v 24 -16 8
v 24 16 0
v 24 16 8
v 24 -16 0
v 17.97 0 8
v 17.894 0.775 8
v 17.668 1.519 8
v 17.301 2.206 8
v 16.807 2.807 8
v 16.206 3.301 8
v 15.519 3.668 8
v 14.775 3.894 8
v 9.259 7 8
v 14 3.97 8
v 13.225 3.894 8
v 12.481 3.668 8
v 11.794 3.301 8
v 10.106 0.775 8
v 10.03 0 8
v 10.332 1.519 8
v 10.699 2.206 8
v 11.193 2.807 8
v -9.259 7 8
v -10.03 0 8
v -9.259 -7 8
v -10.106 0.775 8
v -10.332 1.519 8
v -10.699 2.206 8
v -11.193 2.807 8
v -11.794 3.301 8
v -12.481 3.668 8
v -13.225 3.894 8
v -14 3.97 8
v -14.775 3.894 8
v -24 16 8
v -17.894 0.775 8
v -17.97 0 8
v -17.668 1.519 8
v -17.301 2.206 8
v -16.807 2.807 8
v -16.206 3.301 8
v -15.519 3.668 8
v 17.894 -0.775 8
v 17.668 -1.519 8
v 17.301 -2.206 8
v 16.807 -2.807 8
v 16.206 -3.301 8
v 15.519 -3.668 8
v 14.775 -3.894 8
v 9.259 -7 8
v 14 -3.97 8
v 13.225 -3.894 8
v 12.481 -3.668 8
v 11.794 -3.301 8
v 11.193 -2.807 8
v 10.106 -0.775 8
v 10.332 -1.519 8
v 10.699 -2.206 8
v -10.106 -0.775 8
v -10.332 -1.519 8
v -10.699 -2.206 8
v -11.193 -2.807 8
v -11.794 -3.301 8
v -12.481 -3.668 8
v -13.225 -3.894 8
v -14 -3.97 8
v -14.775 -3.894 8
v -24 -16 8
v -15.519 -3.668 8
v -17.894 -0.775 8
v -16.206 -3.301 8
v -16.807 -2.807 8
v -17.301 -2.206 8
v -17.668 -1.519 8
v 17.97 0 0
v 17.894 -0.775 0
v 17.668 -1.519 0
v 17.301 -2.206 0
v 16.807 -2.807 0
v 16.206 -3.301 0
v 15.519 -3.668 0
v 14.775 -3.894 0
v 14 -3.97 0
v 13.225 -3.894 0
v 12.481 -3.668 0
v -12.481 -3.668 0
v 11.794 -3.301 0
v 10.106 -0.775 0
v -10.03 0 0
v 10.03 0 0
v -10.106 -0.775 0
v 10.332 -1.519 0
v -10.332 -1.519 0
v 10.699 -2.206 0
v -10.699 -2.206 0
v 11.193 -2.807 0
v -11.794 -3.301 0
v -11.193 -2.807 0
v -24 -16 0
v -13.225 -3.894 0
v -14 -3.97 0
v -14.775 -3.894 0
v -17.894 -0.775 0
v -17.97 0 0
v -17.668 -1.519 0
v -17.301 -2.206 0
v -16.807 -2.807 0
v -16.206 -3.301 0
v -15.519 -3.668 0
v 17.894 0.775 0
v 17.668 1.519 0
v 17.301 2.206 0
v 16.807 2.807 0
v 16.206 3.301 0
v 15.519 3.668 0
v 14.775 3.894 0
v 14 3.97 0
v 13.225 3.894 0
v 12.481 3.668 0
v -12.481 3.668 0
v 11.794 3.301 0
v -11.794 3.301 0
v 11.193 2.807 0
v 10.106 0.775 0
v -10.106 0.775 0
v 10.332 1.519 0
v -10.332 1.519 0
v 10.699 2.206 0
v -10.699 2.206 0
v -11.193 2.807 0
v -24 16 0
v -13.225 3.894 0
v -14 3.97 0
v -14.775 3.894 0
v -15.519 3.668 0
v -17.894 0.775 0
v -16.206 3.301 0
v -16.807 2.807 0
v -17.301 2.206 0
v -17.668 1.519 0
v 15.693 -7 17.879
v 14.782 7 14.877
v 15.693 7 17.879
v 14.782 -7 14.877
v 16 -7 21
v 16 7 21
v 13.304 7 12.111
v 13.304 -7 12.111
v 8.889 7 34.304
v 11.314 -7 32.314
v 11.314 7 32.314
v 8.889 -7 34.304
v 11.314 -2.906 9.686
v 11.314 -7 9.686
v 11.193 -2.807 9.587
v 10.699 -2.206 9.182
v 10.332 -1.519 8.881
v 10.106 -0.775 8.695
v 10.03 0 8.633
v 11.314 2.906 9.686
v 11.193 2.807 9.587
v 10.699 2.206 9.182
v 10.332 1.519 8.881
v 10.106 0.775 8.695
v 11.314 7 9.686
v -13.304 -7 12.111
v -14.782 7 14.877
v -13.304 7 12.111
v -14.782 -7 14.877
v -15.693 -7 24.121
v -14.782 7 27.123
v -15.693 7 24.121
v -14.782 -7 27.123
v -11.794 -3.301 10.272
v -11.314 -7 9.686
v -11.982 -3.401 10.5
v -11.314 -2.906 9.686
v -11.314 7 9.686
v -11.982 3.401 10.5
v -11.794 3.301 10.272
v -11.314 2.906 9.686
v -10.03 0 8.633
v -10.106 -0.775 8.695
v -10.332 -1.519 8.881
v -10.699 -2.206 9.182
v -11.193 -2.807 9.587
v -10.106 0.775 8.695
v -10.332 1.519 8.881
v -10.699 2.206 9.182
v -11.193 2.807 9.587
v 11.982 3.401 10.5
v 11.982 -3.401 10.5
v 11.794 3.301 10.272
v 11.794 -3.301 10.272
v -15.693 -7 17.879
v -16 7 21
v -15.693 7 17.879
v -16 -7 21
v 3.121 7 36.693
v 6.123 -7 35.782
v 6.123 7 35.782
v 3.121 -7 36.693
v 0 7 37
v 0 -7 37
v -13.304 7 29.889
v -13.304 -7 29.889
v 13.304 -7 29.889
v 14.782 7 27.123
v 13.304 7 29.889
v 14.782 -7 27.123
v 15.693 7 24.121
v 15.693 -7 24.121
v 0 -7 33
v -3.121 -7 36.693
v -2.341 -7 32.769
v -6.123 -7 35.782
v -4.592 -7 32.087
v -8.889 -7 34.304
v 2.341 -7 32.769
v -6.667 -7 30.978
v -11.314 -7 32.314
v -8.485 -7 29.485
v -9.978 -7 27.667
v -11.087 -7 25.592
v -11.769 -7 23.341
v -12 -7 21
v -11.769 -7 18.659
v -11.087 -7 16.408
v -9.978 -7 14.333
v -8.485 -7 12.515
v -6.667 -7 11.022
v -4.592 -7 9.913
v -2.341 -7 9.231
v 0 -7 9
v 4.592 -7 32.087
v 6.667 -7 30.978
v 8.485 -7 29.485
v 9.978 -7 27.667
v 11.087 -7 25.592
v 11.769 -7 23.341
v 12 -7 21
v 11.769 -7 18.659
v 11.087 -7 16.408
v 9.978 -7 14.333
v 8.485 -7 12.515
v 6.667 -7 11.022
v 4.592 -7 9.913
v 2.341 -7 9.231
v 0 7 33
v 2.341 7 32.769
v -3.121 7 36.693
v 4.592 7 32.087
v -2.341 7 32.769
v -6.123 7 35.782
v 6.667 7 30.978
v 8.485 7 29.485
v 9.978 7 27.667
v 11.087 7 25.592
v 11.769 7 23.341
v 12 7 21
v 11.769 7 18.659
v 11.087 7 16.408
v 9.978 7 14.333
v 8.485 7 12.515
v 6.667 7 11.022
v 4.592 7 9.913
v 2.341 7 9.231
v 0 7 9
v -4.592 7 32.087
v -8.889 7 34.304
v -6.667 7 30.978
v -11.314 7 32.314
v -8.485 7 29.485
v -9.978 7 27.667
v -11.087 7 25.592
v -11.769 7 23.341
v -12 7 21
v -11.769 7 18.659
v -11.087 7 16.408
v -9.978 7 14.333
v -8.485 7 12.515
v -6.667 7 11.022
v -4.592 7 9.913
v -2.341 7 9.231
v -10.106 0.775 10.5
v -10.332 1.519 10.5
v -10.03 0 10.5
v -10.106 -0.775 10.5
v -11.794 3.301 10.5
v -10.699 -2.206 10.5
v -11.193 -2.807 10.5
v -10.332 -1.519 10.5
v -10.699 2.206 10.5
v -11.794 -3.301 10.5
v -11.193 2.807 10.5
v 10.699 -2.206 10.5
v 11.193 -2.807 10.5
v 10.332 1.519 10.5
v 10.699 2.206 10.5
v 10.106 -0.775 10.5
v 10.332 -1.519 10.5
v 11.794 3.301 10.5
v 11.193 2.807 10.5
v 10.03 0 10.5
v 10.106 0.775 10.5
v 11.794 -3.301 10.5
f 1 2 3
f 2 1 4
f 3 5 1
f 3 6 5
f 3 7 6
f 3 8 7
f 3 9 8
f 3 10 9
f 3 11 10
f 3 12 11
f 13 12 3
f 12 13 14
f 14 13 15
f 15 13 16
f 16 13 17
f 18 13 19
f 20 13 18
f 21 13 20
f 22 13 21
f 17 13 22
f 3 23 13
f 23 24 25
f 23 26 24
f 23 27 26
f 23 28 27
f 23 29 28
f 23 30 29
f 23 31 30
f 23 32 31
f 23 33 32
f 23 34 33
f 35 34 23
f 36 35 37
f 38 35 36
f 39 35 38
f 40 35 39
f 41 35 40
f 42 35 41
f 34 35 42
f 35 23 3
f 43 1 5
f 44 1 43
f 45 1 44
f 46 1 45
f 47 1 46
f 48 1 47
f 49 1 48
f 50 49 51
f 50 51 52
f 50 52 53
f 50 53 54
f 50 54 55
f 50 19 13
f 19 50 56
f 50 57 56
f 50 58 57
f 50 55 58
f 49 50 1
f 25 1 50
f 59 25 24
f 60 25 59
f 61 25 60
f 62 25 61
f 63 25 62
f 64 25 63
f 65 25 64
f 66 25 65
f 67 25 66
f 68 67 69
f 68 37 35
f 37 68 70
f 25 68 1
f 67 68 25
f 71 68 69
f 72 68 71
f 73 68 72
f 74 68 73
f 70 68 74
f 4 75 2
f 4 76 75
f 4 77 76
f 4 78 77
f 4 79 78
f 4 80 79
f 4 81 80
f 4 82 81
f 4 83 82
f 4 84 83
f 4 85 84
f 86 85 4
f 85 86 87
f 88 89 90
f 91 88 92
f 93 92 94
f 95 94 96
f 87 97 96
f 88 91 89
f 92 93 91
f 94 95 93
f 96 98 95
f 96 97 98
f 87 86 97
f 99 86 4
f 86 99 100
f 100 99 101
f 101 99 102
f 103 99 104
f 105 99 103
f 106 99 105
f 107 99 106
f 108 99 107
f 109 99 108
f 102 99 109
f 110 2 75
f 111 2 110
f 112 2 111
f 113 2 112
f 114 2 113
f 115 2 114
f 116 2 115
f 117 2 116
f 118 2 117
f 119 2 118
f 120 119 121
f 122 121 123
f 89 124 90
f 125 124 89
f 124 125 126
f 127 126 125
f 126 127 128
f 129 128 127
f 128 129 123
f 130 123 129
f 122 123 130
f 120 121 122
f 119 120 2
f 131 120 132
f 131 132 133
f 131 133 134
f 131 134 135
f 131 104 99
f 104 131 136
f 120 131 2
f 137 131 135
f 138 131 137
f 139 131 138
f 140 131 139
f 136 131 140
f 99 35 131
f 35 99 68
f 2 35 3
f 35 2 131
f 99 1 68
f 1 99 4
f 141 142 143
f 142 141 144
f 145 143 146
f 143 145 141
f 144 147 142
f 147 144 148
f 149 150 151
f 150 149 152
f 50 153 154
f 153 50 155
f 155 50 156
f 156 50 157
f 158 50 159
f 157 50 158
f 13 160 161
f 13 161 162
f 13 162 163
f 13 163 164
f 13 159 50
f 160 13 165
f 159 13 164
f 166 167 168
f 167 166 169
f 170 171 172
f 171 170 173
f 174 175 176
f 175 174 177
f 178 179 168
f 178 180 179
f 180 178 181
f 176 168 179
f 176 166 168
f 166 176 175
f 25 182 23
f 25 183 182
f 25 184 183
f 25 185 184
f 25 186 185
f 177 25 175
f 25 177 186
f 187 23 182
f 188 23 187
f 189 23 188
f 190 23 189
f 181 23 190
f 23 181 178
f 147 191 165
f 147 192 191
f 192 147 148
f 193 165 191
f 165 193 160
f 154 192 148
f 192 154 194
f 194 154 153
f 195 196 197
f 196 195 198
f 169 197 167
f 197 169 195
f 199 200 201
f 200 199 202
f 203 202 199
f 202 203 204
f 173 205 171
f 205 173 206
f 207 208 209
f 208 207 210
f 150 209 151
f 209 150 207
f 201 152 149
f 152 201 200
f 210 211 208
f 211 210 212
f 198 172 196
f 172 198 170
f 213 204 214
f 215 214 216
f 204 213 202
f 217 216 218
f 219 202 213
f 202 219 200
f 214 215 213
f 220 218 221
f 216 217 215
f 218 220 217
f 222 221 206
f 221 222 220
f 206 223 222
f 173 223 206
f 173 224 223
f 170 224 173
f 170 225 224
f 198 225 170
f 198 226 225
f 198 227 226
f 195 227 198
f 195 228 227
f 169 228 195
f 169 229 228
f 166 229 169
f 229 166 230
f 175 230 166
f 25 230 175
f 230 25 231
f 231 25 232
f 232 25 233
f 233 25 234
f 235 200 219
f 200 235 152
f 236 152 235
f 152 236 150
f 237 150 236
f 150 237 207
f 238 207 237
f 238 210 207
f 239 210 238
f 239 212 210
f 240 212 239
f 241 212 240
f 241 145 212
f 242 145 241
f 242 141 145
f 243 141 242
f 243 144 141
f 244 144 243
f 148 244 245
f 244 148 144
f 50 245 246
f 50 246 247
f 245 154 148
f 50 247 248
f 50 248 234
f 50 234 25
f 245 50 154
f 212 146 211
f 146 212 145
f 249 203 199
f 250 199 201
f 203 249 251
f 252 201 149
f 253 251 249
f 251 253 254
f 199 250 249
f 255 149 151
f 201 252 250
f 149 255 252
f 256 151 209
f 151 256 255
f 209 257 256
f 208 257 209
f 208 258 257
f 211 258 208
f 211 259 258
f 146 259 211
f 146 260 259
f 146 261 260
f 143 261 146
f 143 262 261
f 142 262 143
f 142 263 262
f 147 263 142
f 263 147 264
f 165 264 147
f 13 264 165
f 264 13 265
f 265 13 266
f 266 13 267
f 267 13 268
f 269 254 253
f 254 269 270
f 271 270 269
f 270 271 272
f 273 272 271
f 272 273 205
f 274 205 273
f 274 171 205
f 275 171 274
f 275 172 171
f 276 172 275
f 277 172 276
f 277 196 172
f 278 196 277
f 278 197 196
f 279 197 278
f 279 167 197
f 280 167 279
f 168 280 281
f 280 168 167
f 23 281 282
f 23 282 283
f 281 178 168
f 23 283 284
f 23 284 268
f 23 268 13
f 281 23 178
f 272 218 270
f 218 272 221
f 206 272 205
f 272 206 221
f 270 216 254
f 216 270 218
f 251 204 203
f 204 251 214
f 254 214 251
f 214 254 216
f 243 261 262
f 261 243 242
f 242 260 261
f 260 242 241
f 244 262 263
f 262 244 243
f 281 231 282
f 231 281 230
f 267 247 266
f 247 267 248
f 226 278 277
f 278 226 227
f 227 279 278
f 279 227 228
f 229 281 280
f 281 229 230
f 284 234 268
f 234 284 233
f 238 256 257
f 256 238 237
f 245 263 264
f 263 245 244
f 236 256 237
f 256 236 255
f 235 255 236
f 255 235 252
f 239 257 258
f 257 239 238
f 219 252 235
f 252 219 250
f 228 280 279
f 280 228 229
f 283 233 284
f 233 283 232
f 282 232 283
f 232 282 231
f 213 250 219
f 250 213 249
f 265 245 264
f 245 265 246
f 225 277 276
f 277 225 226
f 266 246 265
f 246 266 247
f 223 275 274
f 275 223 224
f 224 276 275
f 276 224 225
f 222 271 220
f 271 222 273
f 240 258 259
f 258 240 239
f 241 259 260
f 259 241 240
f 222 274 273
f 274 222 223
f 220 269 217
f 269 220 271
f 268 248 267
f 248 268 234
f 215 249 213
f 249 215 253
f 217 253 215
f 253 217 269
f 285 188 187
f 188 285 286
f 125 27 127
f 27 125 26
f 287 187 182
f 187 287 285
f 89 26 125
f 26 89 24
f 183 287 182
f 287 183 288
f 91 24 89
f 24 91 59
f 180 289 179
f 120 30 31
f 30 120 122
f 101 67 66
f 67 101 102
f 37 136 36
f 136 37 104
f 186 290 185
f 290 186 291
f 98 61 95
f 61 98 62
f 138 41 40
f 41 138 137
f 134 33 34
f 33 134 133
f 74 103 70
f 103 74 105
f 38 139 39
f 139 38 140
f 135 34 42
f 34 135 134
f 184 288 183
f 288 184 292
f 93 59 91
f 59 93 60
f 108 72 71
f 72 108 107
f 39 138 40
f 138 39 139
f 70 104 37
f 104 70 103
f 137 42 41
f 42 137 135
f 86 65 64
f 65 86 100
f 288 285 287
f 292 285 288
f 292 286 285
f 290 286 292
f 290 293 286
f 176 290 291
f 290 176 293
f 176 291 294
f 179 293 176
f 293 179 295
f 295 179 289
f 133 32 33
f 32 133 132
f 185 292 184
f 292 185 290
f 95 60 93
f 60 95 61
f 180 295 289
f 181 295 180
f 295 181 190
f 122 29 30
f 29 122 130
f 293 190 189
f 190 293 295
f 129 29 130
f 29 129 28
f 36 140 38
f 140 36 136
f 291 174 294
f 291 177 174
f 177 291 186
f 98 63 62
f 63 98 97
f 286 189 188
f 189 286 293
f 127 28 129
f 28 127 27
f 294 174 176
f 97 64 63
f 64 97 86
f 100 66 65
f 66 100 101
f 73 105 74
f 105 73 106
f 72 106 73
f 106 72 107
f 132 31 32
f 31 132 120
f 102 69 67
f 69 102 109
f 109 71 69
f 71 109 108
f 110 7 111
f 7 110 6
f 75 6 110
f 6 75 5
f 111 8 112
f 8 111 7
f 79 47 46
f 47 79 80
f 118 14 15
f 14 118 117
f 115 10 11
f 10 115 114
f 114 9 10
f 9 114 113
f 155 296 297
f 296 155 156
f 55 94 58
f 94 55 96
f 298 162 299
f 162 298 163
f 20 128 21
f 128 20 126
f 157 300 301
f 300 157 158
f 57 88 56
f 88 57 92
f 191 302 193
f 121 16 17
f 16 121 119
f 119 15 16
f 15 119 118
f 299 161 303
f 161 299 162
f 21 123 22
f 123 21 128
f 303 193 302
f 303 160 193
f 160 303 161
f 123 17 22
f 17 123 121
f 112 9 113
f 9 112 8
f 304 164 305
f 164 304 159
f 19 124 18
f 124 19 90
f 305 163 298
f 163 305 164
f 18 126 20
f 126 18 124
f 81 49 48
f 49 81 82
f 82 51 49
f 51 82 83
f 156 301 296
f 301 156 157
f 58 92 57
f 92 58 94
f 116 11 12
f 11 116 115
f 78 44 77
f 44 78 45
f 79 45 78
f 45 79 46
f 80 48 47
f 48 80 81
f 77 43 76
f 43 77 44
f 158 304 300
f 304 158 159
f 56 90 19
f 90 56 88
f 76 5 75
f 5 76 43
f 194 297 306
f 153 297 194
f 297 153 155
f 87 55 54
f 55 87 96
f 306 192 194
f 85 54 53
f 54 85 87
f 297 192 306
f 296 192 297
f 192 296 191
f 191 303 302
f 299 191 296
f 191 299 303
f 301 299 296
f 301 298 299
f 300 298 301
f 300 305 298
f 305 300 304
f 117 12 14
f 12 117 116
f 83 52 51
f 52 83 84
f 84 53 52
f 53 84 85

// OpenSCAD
$fn = 32;

// ----------------------------------------------------------------------
// Deck eye: 32 mm eye on a 48 mm base
// ----------------------------------------------------------------------

// --- parameters (mm) ---
base_l = 48;              // base length
base_w = 32;              // base width
base_t = 8;               // base thickness
eye_r = 16;               // eye outside radius
eye_bore = 24;            // eye bore diameter
eye_w = 14;               // eye thickness
eye_z = 21;               // eye centre height
holes_d = 7.94;           // fixing holes
hole_x = 14;              // fixing hole spacing

difference() {
  union() {
    translate([-24, -16, 0]) cube([base_l, base_w, base_t]);
    /* eye standing upright, its foot sunk 3 mm into the base */
    translate([0, -7, 21]) rotate([-90, 0, 0]) cylinder(h = 14, d = 32);
  }
  /* eye bore, 2.5 mm clear of both faces */
  translate([0, -9.5, 21]) rotate([-90, 0, 0]) cylinder(h = 19, d = 24);
  translate([-14, 0, -2.5]) cylinder(h = base_t + 5, d = holes_d);
  translate([14, 0, -2.5]) cylinder(h = base_t + 5, d = holes_d);
}
